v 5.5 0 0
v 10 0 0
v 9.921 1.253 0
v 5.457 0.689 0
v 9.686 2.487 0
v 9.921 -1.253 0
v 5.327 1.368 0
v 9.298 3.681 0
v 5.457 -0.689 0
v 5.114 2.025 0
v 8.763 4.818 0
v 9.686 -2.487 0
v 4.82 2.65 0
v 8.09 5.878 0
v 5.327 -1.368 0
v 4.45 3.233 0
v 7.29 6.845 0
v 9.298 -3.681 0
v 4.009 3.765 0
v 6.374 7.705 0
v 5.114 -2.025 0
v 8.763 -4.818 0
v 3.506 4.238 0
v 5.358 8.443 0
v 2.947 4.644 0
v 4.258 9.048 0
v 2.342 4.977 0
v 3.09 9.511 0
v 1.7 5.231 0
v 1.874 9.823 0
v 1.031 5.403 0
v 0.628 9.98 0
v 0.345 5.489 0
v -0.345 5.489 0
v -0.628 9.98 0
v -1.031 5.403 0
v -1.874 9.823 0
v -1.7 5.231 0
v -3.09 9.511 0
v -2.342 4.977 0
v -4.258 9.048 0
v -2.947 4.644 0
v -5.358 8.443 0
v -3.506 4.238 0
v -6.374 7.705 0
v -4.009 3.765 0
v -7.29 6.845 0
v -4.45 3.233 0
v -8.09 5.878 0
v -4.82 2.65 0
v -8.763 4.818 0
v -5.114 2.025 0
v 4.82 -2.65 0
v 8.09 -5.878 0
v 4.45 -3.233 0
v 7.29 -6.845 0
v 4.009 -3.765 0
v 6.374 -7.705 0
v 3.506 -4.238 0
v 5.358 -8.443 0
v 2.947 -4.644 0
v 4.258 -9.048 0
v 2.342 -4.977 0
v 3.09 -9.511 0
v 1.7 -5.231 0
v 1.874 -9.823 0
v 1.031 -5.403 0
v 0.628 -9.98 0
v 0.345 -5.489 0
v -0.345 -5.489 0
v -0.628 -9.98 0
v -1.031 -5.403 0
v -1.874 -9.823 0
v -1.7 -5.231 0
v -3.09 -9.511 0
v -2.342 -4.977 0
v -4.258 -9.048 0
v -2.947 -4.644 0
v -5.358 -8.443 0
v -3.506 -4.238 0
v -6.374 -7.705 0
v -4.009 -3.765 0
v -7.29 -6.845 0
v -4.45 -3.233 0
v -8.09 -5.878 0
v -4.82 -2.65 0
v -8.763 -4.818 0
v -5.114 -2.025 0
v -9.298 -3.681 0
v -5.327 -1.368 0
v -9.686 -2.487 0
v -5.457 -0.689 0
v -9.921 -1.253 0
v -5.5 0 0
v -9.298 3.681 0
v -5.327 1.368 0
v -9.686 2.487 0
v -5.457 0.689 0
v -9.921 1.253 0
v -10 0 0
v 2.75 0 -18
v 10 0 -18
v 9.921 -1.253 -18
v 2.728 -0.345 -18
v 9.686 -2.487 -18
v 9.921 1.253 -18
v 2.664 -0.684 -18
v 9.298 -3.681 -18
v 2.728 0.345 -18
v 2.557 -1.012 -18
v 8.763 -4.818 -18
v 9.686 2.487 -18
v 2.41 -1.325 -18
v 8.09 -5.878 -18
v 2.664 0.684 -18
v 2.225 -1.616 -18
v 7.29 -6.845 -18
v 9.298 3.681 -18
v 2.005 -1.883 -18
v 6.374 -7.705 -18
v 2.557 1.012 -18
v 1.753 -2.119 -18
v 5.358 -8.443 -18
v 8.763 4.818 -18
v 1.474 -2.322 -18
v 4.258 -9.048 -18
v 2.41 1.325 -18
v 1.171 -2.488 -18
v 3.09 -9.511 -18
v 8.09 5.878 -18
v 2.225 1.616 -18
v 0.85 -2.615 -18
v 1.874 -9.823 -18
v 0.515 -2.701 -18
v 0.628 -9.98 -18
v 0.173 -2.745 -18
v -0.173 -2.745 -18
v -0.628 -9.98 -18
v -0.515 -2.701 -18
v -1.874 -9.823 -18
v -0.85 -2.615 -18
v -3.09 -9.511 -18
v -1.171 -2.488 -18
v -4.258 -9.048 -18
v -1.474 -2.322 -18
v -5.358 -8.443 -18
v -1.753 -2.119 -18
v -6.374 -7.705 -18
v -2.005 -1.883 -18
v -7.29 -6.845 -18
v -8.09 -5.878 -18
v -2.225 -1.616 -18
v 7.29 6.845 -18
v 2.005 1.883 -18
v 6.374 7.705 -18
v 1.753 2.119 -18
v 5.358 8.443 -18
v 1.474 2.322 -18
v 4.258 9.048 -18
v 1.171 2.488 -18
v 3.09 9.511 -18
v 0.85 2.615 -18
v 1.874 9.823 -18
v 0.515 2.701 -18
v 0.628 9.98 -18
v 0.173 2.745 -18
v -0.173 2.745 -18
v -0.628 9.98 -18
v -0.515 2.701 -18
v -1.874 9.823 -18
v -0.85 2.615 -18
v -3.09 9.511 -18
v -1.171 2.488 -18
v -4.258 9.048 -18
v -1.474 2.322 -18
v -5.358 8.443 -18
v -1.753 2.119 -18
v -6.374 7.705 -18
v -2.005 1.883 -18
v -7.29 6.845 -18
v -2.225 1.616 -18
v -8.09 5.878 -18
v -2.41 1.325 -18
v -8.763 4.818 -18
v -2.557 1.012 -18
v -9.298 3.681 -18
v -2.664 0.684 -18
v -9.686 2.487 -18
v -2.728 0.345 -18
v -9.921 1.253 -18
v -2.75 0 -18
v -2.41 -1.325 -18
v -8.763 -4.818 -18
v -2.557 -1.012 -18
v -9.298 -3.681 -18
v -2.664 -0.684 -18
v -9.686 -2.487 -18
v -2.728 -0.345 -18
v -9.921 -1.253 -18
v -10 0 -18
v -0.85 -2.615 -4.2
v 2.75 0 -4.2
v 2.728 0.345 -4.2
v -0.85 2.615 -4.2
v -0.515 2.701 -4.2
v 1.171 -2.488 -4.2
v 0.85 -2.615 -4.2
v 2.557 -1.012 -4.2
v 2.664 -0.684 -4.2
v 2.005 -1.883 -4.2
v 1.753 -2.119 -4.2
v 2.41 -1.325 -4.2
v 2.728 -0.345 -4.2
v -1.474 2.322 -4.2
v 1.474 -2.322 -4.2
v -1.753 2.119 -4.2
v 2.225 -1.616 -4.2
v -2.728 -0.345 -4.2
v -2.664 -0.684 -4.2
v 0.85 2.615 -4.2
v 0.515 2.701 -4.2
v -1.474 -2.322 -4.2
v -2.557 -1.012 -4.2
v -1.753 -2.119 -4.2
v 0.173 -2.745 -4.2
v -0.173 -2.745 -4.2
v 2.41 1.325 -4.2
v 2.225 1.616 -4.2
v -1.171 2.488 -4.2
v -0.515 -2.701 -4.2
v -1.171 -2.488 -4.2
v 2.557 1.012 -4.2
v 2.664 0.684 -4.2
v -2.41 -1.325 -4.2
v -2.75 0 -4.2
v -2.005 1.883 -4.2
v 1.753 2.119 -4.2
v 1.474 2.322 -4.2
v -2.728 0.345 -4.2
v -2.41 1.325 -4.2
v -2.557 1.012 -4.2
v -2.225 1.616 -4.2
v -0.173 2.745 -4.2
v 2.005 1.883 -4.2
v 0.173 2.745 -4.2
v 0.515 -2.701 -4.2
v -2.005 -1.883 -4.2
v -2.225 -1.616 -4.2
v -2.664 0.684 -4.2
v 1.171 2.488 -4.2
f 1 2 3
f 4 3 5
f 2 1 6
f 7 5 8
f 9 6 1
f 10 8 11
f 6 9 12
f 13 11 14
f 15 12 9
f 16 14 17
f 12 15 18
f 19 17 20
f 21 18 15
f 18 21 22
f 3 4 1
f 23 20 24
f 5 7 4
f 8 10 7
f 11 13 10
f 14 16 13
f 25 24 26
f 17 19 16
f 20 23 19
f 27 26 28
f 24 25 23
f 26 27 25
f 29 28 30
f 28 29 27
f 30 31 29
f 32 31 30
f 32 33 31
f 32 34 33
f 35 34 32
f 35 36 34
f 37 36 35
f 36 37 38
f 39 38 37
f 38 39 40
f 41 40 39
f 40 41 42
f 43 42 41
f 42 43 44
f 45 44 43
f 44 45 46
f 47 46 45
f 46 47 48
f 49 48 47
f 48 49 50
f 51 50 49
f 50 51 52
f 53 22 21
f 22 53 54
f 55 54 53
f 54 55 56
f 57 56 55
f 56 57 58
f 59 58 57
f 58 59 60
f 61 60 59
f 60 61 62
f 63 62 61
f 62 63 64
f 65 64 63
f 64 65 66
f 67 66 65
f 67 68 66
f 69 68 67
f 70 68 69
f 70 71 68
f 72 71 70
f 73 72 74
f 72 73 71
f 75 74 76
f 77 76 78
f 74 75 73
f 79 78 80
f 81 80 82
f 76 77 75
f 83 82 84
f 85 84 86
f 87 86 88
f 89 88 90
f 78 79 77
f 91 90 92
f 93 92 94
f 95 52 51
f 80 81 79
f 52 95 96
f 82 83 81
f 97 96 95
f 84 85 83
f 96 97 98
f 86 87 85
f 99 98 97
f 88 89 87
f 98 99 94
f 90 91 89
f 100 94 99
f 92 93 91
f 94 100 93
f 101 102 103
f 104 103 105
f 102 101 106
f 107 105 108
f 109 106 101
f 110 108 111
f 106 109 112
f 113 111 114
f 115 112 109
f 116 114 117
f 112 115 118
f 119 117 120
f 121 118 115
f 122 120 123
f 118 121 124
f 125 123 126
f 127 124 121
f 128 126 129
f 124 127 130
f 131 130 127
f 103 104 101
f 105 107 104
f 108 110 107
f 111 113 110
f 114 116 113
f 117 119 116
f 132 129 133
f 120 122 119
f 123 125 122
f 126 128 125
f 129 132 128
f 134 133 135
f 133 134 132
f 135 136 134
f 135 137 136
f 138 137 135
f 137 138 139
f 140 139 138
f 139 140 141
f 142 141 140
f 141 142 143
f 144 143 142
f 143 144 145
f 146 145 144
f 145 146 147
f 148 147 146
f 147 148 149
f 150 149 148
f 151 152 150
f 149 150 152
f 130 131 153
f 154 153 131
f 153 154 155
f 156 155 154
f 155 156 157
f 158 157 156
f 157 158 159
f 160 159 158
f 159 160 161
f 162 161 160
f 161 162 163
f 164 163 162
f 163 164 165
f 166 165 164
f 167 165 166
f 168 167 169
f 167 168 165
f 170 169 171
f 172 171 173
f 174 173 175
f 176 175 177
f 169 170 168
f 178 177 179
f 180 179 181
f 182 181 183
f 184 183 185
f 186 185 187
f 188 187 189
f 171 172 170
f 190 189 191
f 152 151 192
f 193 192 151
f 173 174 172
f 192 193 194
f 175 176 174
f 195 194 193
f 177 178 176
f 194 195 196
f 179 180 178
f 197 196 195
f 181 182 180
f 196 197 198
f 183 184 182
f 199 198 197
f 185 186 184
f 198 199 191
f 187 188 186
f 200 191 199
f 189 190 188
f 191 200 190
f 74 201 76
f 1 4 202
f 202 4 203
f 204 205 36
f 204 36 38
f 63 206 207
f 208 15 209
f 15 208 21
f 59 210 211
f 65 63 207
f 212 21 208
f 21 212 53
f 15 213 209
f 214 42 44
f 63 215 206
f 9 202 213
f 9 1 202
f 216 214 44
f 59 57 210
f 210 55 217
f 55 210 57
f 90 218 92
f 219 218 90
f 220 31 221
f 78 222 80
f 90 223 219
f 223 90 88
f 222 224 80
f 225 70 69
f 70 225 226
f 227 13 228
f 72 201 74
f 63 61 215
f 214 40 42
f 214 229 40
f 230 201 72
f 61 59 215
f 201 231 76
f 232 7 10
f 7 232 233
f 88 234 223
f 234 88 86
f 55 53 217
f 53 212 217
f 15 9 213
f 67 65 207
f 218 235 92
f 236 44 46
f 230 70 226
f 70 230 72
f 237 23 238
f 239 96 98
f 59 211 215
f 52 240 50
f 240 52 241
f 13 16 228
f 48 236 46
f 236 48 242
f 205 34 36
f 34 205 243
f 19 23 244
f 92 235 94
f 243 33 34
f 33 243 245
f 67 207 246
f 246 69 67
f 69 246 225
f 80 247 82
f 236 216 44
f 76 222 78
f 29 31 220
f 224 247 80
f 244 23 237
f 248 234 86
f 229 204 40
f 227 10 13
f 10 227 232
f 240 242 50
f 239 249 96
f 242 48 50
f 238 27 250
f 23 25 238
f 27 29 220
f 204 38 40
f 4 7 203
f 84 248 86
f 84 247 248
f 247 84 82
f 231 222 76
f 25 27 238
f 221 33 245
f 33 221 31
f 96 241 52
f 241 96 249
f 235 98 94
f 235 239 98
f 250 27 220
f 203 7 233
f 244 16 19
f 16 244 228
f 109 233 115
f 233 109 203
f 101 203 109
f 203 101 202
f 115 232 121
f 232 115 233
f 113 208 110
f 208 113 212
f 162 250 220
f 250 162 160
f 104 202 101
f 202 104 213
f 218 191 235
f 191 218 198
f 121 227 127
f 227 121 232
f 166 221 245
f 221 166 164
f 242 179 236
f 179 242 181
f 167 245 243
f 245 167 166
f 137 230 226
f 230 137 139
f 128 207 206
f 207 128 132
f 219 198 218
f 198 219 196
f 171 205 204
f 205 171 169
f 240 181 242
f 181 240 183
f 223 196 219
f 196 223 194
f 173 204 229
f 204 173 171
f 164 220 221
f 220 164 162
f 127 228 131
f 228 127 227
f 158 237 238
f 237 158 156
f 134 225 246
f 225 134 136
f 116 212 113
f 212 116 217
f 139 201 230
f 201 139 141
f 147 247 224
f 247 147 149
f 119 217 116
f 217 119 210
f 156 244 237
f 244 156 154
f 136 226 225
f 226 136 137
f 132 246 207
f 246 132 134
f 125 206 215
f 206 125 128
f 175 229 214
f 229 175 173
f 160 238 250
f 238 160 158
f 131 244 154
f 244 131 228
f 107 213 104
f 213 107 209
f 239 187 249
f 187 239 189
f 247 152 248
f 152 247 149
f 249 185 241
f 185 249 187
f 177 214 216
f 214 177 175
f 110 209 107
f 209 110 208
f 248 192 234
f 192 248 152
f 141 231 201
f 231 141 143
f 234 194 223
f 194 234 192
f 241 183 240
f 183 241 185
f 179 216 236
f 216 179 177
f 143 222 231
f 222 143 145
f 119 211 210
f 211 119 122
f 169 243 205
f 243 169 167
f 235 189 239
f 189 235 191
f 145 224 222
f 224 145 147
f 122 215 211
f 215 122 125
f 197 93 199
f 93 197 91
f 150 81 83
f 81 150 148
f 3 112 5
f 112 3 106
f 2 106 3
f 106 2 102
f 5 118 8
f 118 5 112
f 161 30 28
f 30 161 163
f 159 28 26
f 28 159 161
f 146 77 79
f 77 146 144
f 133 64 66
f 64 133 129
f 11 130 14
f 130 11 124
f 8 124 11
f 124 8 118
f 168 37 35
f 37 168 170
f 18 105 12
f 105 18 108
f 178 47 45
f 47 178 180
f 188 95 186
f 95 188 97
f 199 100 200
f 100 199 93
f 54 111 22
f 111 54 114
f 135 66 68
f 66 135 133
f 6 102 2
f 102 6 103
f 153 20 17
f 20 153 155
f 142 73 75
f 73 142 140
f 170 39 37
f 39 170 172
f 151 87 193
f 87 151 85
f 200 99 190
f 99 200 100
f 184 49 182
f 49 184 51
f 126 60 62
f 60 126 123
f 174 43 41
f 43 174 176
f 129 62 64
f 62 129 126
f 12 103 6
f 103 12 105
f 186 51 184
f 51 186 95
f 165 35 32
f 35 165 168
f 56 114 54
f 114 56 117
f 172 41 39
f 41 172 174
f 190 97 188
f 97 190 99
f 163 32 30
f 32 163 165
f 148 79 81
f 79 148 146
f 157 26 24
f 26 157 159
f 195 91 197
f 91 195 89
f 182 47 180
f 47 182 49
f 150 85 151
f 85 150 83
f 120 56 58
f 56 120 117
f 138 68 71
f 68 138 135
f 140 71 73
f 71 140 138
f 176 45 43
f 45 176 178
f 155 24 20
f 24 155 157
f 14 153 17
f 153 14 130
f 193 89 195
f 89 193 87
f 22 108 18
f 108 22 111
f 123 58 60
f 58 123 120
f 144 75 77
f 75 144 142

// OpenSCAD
$fn = 50;


difference() {
	union() {
		translate(v = [0, 0, -18.0000000000]) {
			cylinder(h = 18, r = 10.0000000000);
		}
		cylinder(h = 0, r = 13.0000000000);
	}
	union() {
		translate(v = [0, 0, 0]) {
			rotate(a = [0, 0, 0]) {
				difference() {
					union() {
						#translate(v = [0, 0, -18.0000000000]) {
							cylinder(h = 18, r = 2.2500000000);
						}
						#translate(v = [0, 0, -4.2000000000]) {
							cylinder(h = 4.2000000000, r = 10.0000000000, r1 = 2.7500000000, r2 = 5.5000000000);
						}
						#translate(v = [0, 0, -18.0000000000]) {
							cylinder(h = 18, r = 2.7500000000);
						}
						#translate(v = [0, 0, -18.0000000000]) {
							cylinder(h = 18, r = 2.2500000000);
						}
					}
					union();
				}
			}
		}
	}
}
